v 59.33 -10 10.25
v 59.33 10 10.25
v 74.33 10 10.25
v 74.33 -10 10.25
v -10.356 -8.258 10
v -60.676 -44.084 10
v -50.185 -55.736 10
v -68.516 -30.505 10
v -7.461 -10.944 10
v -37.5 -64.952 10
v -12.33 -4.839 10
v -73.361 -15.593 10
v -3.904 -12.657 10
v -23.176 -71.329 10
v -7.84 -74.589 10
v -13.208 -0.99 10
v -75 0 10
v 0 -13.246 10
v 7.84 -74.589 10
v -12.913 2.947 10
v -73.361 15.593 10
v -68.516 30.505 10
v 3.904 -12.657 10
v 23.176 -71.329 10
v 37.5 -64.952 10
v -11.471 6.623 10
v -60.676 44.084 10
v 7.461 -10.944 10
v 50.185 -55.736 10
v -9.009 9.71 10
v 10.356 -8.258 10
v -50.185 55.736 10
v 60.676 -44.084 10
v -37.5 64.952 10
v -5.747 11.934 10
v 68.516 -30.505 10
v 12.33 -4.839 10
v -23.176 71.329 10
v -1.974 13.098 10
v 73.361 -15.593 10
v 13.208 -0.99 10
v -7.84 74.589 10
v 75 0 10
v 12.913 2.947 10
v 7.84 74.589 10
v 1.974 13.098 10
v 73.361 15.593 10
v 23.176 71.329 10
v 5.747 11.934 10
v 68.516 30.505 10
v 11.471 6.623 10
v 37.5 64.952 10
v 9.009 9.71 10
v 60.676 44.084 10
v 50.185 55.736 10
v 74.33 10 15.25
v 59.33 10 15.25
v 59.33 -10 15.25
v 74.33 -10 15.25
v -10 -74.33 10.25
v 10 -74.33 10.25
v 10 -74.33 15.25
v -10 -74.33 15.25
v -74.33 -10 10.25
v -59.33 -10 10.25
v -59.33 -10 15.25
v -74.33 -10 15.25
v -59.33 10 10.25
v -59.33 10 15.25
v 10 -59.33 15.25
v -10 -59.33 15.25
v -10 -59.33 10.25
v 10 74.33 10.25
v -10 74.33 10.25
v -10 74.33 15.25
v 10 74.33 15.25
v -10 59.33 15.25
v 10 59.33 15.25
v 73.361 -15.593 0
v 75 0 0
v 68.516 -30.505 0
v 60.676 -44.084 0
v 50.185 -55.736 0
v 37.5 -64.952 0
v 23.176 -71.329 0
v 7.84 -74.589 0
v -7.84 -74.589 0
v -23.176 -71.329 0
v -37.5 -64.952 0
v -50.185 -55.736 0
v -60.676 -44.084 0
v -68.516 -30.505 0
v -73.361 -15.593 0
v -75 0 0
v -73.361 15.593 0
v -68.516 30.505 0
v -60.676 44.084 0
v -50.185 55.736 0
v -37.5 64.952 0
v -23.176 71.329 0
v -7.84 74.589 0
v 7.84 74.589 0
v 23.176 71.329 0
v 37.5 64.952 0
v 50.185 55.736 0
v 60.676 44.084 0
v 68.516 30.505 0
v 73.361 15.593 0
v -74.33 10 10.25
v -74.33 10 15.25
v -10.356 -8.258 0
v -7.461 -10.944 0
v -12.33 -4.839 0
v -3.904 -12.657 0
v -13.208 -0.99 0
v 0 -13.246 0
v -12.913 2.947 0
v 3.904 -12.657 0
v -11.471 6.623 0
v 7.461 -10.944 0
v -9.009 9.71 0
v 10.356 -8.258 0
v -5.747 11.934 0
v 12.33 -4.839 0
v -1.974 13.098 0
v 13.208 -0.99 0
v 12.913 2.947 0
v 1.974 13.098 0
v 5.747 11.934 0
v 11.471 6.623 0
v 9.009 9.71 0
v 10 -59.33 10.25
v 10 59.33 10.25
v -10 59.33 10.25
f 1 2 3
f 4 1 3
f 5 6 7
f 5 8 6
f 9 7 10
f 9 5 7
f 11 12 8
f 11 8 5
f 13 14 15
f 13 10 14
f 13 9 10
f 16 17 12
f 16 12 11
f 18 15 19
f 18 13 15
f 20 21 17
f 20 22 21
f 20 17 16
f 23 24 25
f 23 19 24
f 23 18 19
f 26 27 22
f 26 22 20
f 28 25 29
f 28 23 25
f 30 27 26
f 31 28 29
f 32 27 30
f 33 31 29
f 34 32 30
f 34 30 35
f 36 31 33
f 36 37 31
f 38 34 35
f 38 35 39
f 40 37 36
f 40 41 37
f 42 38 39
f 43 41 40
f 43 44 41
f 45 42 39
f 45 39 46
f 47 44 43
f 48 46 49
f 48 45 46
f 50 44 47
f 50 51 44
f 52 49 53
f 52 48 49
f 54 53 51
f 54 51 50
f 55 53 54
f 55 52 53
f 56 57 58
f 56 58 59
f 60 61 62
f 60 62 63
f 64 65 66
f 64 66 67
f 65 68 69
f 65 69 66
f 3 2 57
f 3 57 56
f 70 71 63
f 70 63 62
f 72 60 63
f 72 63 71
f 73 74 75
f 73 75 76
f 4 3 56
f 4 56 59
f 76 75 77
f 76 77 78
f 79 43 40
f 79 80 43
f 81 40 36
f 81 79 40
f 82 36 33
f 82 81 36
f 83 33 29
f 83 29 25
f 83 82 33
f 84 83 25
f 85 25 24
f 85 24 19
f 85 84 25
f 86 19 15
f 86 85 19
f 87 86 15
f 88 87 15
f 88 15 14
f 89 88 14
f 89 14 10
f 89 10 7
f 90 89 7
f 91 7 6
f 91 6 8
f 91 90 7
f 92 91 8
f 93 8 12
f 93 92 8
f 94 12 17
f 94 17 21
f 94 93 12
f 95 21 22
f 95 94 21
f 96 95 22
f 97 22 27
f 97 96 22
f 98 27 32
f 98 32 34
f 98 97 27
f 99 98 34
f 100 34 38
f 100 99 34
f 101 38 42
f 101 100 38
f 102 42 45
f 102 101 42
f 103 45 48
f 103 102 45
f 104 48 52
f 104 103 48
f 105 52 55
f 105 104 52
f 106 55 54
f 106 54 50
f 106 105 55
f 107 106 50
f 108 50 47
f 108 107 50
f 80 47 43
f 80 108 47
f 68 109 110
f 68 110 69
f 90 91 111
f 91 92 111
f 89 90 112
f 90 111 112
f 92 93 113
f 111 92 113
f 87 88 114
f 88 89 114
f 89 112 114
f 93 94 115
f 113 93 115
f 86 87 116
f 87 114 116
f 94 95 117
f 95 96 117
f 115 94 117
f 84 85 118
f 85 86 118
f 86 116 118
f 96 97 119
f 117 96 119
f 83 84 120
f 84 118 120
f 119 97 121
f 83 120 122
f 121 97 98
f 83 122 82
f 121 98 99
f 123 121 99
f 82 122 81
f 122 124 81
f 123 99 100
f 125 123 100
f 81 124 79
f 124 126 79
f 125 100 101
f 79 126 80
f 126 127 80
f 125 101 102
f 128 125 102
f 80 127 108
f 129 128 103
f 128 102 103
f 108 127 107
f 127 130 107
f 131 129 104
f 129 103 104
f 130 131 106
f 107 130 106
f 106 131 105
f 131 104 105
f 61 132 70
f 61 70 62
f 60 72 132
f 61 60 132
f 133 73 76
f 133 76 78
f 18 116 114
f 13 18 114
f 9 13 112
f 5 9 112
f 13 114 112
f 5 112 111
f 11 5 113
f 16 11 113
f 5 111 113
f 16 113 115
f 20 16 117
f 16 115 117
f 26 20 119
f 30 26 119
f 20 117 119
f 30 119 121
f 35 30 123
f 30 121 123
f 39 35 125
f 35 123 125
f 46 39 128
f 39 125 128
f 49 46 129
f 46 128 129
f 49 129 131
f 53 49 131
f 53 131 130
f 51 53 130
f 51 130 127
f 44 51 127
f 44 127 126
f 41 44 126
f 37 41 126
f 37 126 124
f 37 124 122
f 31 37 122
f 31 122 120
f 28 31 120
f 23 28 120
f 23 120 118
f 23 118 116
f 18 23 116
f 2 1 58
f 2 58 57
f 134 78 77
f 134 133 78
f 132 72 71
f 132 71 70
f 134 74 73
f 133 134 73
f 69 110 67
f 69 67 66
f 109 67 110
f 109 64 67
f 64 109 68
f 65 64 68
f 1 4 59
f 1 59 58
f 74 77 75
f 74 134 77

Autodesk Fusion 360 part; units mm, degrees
sketch "wheel" plane through (0, 0, 0) normal (0, 0, 1) x (1, 0, 0)
  circle A0 centre (0, 0) radius 75
  dimension "d1" = 150
extrude "Extrude1" add sketch "wheel" along normal blind 10 makes body 1
hole "Hole1" at (0, 0, 10) direction (0, 0, -1) diameter 30 depth 35 tip angle 118 bodies 1
thread "Thread1" "ISO Metric profile 30.0 M30x3.5 6H" major diameter 30.3925 minor diameter 26.491 pitch 3.5 angle 60 resizes the face on face at (0.7477, -14.9814, 6.6667) on bodies 1
ref_plane "WorkPlane1" through (0, 0, 10.25) normal (0, 0, 1) x (1, 0, 0)
sketch "connection block" plane through (0, 0, 10.25) normal (0, 0, 1) x (1, 0, 0)
  circle A0 centre (0, 0) radius 75
  line L0 (-10, 74.3303) -> (10, 74.3303)
  line L1 (10, 59.3303) -> (-10, 59.3303)
  line L2 (-10, 59.3303) -> (-10, 74.3303)
  line L3 (10, 74.3303) -> (10, 59.3303)
  line L4 (-59.3303, -10) -> (-74.3303, -10)
  line L5 (-59.3303, 10) -> (-59.3303, -10)
  line L6 (-74.3303, 10) -> (-59.3303, 10)
  line L7 (-74.3303, -10) -> (-74.3303, 10)
  line L8 (10, -59.3303) -> (10, -74.3303)
  line L9 (-10, -59.3303) -> (10, -59.3303)
  line L10 (-10, -74.3303) -> (-10, -59.3303)
  line L11 (10, -74.3303) -> (-10, -74.3303)
  line L12 (59.3303, 10) -> (74.3303, 10)
  line L13 (59.3303, -10) -> (59.3303, 10)
  line L14 (74.3303, -10) -> (59.3303, -10)
  line L15 (74.3303, 10) -> (74.3303, -10)
  point P0 (-10, 74.3303)
  point P1 (10, 74.3303)
  point P2 (10, 59.3303)
  point P3 (-9.0313, 59.3303)
  dimension "d8" = 20
  dimension "d9" = 15
  dimension "d11" = 360
extrude "Extrude2" add sketch "connection block" along normal blind 5 separate body contours L12 L13 L14 L15 | L0 L1 L2 L3 | L8 L9 L10 L11 | L4 L5 L6 L7 makes body 2 at (69.3303, -3.3333, 10.25) makes body 3 at (3.3333, 69.3303, 10.25) makes body 4 at (-64.3303, 3.3333, 10.25) makes body 5 at (-3.3333, -69.3303, 10.25)
